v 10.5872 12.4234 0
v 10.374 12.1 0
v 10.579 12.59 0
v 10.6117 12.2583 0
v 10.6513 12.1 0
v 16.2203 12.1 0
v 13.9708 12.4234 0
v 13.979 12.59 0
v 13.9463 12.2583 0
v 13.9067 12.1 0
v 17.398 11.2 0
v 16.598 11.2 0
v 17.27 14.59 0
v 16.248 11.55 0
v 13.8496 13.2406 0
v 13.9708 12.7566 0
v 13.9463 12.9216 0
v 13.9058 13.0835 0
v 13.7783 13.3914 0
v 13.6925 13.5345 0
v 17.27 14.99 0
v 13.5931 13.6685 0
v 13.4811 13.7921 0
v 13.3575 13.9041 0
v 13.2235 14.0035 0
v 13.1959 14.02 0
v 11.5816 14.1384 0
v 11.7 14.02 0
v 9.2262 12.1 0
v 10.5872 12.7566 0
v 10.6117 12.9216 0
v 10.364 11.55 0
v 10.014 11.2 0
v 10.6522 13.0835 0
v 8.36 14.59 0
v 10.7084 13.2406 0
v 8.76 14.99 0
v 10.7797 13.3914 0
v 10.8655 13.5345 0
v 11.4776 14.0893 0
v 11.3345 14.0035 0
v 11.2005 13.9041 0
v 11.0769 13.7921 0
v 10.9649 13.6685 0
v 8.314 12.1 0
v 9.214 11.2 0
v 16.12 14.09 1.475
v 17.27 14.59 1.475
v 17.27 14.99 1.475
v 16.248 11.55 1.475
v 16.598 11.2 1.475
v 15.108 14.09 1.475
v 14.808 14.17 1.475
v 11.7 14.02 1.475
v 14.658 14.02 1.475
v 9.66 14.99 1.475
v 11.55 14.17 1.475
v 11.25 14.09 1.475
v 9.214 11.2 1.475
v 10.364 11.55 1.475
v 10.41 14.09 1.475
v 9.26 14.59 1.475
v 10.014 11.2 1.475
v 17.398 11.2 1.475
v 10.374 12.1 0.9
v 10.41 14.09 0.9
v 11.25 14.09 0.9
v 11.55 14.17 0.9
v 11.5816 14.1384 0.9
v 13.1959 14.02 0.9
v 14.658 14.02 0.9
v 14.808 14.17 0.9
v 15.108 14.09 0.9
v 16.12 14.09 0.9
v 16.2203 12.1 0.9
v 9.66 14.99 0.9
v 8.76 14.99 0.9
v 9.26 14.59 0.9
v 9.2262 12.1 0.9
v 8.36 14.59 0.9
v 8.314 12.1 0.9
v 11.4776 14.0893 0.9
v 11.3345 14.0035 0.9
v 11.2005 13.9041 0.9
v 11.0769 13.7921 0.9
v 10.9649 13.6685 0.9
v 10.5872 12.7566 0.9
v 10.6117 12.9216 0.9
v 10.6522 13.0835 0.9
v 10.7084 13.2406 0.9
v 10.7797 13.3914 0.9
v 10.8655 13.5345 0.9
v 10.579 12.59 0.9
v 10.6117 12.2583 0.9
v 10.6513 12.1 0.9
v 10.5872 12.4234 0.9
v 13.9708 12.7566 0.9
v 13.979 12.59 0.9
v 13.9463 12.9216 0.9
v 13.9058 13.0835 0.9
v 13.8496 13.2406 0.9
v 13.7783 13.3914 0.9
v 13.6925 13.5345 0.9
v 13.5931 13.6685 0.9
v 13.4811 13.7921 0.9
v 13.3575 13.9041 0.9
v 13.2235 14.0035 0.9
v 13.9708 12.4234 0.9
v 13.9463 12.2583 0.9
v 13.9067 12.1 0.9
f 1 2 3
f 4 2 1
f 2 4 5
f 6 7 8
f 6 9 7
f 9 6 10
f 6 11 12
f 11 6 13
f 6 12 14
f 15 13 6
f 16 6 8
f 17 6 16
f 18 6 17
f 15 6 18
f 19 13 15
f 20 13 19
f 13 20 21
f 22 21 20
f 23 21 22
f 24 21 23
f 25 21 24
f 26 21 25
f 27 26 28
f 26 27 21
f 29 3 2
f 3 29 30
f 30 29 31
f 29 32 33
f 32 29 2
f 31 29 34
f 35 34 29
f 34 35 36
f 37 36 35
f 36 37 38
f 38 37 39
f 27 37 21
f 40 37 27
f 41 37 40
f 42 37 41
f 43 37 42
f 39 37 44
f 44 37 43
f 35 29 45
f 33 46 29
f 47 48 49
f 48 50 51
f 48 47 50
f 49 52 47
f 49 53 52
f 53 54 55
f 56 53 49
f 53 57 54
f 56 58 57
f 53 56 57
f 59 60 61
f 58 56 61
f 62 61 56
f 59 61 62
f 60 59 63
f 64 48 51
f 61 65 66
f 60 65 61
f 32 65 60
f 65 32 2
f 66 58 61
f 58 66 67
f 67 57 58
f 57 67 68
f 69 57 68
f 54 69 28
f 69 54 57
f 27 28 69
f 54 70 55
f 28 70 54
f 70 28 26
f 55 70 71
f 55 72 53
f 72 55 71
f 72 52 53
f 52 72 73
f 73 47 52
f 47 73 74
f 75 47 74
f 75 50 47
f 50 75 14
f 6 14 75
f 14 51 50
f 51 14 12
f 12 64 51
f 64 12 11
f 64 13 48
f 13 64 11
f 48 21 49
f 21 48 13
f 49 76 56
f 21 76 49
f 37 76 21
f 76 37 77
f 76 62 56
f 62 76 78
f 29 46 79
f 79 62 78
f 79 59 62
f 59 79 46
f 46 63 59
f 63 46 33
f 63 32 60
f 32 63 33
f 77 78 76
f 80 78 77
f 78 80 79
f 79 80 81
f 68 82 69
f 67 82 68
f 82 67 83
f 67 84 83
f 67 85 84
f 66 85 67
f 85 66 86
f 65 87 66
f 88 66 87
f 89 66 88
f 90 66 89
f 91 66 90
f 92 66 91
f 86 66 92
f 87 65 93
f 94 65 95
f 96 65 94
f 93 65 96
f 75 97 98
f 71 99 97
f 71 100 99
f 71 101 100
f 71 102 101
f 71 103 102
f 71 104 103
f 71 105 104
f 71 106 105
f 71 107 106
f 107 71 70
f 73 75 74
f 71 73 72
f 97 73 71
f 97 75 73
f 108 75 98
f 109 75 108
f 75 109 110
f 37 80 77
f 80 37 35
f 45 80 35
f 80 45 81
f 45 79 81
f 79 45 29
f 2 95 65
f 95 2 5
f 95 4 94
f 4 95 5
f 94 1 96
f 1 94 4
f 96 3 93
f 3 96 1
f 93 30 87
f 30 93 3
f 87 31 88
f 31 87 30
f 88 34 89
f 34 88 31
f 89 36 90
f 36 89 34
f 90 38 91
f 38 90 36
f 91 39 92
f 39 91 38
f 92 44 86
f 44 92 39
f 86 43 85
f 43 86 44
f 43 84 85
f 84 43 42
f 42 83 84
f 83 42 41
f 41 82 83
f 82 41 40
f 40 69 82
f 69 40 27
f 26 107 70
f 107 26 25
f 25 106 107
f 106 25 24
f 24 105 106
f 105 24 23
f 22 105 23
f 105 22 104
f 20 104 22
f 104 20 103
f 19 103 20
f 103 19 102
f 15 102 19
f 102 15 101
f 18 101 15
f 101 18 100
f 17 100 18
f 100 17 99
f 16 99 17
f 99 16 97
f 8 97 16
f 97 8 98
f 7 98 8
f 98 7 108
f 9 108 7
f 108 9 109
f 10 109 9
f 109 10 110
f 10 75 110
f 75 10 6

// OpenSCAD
// Kia EV6 Outlet Interlock - Anti-Spreading Tower Prong Clamp (Option 2)
// Generated by build_clamp.py

$fn = 64;

// Global parameters
z_top = 14.09;
roof_thick = 0.9;
wall_thick = 1.15;
side_thick = 1.0;
pin_clearance_r = 1.7;
y_axle = 9.279;
z_axle = 12.59;

module tower_clamp_left() {
    // Left Tower Clamp with outer side retention ears and zero pin contact
    difference() {
        union() {
            // Main U-saddle
            translate([3.90, 0, 0])
                linear_extrude(height = 1.475)
                    polygon(points = [
                        [5.314, 11.20], [5.360, 14.59], [5.760, 14.99],
                        [13.370, 14.99], [13.370, 14.59], [13.498, 11.20],
                        [12.698, 11.20], [12.348, 11.55], [12.220, 14.09],
                        [11.208, 14.09], [10.908, 14.17], [10.758, 14.02],
                        [7.800, 14.02], [7.650, 14.17], [7.350, 14.09],
                        [6.510, 14.09], [6.464, 11.55], [6.114, 11.20]
                    ]);
            // Outer side wall
            translate([3.00, 0, 0])
                linear_extrude(height = 0.90)
                    difference() {
                        polygon(points = [
                            [5.314, 12.10], [5.360, 14.59], [5.760, 14.99],
                            [13.370, 14.99], [13.370, 14.59], [13.498, 12.10],
                            [10.75, 12.10], [7.80, 12.10]
                        ]);
                        // Pin clearance arch
                        translate([y_axle, z_axle])
                            circle(r = pin_clearance_r);
                    }
        }
    }
}

tower_clamp_left();
